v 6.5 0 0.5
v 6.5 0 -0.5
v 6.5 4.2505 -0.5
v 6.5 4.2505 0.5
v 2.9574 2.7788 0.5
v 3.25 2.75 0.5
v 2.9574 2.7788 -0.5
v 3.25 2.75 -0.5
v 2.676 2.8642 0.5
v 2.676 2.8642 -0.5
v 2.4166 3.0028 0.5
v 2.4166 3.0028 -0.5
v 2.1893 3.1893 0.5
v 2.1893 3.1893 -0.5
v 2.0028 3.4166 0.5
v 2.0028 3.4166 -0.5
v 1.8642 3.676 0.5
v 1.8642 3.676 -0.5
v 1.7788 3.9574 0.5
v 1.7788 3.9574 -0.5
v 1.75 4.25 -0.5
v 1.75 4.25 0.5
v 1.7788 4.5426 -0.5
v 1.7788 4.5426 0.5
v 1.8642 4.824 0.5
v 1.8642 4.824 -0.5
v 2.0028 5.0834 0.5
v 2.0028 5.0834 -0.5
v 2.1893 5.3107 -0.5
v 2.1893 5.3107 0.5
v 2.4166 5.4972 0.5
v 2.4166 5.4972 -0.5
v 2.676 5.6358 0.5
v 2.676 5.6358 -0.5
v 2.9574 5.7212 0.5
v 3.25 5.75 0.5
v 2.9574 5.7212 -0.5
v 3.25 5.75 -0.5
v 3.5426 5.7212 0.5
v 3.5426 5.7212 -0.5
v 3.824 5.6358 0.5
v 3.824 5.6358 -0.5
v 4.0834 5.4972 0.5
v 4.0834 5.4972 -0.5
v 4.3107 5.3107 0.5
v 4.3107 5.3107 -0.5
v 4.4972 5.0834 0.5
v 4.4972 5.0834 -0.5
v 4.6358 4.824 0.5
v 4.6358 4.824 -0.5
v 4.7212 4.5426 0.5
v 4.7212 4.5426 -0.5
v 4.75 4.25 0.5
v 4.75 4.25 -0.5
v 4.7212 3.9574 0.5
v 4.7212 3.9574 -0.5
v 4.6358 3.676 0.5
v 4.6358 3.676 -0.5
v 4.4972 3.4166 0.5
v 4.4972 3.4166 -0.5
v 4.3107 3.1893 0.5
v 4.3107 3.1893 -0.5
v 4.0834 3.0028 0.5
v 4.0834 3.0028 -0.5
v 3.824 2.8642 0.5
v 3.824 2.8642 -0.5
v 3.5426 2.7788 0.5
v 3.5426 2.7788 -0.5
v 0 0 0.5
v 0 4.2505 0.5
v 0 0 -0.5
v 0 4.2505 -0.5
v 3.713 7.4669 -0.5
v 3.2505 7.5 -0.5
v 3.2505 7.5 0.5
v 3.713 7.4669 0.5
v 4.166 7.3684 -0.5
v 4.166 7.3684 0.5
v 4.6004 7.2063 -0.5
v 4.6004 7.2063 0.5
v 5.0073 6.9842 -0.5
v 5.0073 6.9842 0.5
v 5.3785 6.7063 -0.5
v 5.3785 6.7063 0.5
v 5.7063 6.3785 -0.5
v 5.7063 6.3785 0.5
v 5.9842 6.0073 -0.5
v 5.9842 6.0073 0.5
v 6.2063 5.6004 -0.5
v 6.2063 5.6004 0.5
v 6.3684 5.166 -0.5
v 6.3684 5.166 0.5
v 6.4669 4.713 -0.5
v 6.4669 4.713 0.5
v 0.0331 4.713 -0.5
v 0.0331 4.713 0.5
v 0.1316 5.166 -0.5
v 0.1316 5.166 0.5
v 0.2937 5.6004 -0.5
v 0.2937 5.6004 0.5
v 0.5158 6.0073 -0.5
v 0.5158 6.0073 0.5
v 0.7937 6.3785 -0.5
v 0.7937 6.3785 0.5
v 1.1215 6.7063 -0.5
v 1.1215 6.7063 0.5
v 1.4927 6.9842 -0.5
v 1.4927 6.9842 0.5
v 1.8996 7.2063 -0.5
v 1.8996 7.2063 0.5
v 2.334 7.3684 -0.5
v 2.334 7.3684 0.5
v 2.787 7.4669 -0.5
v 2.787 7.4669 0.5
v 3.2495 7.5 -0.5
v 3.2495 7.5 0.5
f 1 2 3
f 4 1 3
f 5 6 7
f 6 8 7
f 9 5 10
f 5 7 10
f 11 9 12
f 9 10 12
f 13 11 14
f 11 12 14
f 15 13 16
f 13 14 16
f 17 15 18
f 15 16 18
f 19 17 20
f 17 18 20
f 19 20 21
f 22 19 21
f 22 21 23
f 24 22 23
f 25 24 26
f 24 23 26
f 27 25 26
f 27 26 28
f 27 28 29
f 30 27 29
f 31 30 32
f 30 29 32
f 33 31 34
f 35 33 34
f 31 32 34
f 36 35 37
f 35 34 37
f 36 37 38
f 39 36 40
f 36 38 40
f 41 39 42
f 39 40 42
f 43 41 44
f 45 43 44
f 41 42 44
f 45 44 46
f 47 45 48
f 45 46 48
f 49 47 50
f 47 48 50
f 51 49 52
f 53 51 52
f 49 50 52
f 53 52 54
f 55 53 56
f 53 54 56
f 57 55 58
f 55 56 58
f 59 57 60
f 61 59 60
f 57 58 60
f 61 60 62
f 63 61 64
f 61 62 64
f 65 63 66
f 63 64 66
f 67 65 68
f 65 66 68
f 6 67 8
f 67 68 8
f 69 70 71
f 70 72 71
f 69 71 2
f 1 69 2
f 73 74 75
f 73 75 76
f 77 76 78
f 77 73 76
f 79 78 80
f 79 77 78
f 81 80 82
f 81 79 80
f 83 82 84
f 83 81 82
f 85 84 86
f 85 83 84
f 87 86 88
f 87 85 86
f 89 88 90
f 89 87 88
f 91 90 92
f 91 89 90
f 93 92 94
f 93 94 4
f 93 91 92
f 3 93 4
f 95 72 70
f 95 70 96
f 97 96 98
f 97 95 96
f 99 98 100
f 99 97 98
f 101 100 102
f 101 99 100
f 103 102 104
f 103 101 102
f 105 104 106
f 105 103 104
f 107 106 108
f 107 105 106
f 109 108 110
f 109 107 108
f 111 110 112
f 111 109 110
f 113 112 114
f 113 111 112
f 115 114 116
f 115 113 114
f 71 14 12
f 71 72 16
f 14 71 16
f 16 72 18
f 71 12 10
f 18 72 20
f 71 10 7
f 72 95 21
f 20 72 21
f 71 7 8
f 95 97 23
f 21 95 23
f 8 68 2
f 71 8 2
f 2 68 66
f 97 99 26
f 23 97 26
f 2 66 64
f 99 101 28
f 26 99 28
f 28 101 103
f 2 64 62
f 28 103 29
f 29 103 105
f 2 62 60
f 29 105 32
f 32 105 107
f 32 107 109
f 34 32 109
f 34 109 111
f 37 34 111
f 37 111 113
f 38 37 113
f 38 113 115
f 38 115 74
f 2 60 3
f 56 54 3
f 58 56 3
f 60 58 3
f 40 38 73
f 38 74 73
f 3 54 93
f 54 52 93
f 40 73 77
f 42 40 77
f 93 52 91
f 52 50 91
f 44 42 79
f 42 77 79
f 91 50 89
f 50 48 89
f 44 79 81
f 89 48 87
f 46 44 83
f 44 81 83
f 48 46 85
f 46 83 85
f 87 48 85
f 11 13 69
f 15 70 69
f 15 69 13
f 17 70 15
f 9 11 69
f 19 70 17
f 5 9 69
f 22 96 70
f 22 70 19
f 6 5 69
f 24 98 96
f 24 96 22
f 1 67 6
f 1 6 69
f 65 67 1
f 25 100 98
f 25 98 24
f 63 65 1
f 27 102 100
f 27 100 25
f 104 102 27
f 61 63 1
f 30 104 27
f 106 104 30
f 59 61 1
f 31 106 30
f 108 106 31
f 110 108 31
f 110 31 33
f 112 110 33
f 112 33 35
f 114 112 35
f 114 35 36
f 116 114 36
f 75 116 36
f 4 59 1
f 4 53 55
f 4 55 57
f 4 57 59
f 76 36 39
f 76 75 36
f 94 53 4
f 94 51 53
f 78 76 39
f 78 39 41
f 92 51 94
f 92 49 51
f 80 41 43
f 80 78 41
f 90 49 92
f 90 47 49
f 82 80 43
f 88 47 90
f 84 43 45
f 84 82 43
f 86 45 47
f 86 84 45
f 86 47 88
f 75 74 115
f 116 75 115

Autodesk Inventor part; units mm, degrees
ref_plane "YZ Plane" through (0, 0, 0) normal (1, 0, 0) x (0, 1, 0)
ref_plane "XZ Plane" through (0, 0, 0) normal (0, 1, 0) x (-1, 0, 0)
ref_plane "XY Plane" through (0, 0, 0) normal (0, 0, 1) x (1, 0, 0)
sketch "Szkic1" plane through (0, 0, 0) normal (0, 0, 1) x (1, 0, 0)
  line L0 (0, 0) -> (6.5, 0)
  line L1 (6.5, 0) -> (6.5, 7.5)
  line L2 (6.5, 7.5) -> (0, 7.5)
  line L3 (0, 7.5) -> (0, 0)
  point P0 (3.25, 4.25)
  dimension "d0" = 6.5
  dimension "d5" = 3.25
  dimension "d6" = 4.25
extrude "Wyciągnięcie proste1" add sketch "Szkic1" along normal mid plane 1
fillet "Zaokrąglenie1" radius 3.25 2 edges at (6.5, 7.5, 0) (0, 7.5, 0)
hole "Otwór1" at (3.25, 4.25, 0) direction (0, 0, -1) diameter 3 end through all both
properties part number "podporka_mala"
